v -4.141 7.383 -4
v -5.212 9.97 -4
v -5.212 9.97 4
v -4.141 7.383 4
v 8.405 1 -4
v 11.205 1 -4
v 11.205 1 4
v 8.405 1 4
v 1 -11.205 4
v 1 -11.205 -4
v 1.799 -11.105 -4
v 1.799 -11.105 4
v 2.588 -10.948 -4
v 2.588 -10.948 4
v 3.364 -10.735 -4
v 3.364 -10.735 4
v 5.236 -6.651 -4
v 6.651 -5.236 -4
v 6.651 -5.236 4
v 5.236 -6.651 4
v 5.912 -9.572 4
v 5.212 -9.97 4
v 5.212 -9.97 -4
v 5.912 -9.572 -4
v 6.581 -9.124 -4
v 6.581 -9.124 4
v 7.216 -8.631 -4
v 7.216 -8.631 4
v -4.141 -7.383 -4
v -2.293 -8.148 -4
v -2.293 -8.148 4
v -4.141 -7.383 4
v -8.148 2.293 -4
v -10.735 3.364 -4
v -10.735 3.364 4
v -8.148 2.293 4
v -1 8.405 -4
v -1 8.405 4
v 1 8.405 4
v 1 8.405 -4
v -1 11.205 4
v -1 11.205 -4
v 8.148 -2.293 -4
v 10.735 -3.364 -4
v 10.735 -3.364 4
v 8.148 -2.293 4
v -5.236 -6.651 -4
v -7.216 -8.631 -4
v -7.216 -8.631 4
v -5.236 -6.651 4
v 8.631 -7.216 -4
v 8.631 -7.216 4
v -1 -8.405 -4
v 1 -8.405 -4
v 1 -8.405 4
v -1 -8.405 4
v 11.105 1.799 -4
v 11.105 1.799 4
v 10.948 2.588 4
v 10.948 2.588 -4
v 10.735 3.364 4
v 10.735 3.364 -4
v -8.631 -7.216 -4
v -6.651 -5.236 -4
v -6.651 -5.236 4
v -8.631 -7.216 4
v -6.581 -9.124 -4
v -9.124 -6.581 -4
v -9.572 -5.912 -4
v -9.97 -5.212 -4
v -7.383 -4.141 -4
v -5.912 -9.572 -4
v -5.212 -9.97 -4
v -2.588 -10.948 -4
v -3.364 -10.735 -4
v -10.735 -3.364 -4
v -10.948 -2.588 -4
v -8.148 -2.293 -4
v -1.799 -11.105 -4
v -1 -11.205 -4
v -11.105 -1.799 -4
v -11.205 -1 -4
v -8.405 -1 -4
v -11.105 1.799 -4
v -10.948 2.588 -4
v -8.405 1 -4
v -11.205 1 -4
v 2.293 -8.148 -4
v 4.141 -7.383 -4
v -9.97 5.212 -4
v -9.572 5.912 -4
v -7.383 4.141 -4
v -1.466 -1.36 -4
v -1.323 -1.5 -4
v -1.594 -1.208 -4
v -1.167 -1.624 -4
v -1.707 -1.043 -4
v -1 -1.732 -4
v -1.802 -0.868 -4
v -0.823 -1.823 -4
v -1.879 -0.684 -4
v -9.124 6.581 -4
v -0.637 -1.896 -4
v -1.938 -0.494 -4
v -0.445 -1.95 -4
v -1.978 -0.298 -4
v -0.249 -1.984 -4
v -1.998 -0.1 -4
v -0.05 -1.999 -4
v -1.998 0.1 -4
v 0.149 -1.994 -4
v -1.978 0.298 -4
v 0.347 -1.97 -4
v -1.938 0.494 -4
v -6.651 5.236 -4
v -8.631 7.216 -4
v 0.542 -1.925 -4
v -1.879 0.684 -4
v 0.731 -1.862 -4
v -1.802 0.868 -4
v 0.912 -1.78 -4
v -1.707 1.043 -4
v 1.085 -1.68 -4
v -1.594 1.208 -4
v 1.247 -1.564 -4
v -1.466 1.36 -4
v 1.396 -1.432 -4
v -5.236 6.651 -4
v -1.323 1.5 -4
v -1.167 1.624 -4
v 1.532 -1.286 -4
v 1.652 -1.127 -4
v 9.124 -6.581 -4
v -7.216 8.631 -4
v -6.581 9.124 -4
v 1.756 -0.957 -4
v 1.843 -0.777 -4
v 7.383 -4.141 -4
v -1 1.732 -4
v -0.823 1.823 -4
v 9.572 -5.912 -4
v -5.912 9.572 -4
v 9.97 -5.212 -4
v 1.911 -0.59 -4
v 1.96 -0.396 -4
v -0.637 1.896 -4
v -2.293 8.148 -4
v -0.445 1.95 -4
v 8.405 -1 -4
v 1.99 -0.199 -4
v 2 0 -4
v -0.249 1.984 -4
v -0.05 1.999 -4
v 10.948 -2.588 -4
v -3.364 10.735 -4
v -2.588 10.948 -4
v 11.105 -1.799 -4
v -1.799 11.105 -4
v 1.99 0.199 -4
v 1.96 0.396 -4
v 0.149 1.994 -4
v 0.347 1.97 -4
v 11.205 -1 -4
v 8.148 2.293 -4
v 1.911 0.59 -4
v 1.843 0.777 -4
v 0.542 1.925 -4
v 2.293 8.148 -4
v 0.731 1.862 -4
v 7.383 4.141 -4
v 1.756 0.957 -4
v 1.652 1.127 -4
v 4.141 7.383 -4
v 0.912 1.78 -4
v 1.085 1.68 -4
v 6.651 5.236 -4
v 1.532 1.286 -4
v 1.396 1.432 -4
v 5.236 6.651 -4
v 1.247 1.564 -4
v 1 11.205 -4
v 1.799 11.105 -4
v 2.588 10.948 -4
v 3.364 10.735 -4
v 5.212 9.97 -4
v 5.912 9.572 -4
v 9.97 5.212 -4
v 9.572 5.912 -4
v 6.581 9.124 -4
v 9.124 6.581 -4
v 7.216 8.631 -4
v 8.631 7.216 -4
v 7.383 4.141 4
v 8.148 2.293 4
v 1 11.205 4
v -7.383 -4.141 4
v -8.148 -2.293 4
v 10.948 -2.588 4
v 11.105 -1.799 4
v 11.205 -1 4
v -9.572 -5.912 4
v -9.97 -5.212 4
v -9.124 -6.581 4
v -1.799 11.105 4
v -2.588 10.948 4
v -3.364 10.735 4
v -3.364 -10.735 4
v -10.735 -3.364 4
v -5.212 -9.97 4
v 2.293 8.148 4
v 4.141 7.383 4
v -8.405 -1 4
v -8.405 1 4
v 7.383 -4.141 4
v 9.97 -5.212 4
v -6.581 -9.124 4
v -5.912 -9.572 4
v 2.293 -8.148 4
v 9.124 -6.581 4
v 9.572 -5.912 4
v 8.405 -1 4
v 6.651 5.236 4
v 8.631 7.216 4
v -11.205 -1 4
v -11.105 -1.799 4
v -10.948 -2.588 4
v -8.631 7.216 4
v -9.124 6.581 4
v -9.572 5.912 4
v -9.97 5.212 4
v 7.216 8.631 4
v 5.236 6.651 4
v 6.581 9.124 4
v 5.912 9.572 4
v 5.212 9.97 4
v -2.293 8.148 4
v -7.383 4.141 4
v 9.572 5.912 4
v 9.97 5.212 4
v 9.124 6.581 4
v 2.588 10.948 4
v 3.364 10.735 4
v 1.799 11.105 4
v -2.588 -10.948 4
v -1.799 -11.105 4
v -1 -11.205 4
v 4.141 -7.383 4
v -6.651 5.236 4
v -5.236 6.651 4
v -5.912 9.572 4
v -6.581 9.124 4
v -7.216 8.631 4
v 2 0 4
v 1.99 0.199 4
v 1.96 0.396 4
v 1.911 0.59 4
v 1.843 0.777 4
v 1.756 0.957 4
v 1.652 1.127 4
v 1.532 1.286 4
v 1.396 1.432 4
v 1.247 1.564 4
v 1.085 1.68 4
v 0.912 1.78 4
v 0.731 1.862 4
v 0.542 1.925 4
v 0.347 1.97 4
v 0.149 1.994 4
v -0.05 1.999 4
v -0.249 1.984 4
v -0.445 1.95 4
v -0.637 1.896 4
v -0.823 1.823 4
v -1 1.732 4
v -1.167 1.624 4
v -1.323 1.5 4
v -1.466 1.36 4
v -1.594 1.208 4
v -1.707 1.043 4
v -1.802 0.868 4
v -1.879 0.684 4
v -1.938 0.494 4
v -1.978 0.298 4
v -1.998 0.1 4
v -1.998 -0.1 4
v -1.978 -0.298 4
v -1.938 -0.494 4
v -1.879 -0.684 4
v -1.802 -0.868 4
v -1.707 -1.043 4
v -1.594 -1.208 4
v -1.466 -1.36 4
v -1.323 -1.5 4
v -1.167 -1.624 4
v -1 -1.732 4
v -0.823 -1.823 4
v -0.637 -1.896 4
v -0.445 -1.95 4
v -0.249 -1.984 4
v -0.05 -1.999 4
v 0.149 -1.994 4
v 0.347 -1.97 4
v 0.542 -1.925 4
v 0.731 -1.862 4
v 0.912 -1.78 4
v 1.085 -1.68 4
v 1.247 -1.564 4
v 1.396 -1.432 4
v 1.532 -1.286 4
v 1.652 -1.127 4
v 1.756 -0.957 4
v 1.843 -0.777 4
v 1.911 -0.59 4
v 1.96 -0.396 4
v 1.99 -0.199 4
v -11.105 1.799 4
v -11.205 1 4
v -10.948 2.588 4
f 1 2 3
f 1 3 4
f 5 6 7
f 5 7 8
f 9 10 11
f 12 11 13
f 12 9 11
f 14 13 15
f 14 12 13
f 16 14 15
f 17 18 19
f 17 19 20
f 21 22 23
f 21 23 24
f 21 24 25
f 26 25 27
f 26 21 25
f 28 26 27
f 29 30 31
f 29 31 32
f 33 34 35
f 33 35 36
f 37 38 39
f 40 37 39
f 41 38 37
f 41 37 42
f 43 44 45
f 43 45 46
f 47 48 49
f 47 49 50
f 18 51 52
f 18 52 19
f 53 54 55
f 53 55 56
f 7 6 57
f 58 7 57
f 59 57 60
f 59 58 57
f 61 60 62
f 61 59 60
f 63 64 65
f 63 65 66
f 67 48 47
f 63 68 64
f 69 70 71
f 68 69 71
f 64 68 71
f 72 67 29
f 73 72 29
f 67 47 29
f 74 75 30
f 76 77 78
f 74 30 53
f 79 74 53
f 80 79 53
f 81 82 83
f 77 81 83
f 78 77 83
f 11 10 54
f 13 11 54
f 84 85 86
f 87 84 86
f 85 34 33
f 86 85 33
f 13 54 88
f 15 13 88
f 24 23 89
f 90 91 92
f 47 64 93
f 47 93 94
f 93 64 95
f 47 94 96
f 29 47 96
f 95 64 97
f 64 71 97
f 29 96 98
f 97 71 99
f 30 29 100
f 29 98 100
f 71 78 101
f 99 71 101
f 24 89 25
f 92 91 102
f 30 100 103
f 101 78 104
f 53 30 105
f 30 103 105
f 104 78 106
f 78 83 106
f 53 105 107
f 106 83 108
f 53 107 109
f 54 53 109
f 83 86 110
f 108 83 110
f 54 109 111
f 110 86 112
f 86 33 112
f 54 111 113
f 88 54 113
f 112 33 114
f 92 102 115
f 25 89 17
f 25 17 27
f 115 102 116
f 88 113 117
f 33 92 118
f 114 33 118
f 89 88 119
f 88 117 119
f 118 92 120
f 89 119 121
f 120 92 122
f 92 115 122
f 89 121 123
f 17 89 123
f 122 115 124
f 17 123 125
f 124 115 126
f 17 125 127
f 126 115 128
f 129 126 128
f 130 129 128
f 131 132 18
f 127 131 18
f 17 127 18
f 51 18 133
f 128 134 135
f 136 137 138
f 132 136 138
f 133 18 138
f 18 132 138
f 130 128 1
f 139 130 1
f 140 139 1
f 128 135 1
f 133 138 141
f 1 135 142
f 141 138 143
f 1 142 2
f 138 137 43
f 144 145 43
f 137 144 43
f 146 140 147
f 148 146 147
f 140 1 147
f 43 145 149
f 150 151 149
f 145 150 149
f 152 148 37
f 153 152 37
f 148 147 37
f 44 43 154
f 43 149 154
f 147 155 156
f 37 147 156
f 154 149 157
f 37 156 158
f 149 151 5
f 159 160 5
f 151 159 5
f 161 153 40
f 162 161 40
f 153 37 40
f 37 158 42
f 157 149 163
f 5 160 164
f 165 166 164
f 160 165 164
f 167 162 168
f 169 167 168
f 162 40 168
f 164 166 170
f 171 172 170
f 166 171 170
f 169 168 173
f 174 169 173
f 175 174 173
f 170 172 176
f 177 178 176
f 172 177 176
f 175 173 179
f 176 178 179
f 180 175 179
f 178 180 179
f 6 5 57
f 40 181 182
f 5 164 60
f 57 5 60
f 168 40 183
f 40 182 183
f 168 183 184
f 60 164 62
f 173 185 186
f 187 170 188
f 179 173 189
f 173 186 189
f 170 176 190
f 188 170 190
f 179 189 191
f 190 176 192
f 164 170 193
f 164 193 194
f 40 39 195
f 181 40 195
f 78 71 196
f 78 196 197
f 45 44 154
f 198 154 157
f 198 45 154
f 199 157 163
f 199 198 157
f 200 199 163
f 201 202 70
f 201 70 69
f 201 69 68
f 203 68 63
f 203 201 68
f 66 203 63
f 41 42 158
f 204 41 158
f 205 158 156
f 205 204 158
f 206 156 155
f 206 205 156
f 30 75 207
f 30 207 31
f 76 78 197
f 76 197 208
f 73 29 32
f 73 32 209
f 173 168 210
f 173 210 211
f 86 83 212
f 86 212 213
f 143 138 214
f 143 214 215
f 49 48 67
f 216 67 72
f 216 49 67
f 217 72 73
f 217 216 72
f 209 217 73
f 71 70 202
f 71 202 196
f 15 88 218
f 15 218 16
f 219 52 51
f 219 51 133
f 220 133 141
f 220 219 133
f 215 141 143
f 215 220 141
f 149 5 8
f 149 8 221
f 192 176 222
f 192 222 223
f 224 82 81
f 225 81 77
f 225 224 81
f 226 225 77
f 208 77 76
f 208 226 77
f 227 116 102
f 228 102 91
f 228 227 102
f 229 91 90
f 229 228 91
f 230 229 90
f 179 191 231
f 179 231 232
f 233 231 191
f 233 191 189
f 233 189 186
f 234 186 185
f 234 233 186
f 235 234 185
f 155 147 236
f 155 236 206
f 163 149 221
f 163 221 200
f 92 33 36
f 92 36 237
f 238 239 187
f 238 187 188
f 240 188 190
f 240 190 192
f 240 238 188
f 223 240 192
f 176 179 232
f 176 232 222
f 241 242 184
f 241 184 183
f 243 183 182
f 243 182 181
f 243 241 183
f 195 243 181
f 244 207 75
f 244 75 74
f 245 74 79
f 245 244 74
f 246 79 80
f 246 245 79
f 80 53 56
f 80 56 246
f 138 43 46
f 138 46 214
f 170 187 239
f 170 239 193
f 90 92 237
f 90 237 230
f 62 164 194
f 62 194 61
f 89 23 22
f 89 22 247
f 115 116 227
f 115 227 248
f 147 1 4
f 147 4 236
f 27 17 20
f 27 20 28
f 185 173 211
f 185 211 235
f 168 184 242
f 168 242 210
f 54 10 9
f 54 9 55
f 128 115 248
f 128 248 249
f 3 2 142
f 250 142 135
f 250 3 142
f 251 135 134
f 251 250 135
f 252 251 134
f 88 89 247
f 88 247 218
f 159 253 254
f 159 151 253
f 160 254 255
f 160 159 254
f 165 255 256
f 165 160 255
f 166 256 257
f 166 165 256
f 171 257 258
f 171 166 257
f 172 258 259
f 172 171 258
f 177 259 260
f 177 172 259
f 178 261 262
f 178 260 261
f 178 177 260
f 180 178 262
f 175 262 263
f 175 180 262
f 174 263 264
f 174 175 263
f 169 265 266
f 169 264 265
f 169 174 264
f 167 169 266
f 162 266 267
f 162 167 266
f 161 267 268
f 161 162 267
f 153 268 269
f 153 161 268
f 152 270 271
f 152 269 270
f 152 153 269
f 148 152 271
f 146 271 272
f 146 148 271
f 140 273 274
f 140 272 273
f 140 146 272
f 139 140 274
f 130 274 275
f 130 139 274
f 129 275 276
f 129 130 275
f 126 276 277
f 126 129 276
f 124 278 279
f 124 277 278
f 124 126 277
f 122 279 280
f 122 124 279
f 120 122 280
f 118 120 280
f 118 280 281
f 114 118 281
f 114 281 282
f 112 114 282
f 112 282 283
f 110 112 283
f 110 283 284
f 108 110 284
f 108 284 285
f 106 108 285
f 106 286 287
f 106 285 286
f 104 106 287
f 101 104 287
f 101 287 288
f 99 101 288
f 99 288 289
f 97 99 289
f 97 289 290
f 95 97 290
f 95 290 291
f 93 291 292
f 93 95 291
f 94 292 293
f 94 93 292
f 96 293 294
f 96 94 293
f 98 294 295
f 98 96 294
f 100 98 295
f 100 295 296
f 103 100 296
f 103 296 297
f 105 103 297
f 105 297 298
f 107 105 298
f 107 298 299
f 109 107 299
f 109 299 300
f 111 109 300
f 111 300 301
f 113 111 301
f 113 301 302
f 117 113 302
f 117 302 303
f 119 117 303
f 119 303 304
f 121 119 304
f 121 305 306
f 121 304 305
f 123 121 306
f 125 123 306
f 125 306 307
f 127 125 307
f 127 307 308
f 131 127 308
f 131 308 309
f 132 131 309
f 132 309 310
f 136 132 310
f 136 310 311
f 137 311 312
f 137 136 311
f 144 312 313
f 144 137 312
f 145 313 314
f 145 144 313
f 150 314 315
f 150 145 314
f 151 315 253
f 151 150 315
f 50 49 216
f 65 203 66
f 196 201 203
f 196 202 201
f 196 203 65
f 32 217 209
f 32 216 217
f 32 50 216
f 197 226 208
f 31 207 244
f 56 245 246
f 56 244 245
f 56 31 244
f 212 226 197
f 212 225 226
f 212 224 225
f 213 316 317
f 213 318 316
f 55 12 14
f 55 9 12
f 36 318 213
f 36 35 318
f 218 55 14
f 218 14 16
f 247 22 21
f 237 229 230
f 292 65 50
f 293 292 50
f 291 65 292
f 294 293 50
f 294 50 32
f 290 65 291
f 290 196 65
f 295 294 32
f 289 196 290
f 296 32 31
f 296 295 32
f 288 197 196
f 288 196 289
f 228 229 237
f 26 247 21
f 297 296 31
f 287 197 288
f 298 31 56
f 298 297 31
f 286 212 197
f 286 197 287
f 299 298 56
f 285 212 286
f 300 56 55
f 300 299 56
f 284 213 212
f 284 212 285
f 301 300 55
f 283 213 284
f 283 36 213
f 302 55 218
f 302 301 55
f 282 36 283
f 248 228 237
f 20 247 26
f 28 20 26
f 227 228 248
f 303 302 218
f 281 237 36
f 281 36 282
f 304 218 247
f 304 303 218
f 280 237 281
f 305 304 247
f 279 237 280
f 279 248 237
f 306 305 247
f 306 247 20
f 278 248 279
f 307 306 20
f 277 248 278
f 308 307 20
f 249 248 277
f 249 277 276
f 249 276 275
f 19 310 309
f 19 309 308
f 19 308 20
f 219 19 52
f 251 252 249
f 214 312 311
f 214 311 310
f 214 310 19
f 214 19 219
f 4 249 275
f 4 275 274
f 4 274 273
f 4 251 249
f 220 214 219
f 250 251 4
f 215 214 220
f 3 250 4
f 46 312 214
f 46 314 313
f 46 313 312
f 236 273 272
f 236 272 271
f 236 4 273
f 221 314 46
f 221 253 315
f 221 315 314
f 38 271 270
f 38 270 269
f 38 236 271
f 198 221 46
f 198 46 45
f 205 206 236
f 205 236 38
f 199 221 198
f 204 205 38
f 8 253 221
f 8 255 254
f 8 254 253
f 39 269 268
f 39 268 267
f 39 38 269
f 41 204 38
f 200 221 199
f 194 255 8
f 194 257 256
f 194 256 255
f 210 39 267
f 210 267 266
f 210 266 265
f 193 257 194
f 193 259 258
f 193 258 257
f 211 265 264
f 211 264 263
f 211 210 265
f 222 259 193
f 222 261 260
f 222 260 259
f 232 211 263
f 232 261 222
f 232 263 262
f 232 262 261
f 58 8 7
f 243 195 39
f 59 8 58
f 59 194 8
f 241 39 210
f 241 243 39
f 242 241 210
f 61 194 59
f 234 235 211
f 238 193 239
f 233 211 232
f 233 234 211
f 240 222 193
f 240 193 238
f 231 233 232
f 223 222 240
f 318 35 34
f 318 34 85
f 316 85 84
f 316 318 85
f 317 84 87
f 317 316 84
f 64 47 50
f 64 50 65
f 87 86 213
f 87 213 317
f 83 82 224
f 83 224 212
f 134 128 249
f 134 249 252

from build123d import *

# Parameters (mm, degrees)
SKETCH1_R               = 11.25
BOSS_EXTRUDE1_DEPTH     = 4
SKETCH2_W               = 2
SKETCH2_H               = 2.8
CUT_EXTRUDE2_DEPTH      = 18.808003819
CIRPATTERN1_START       = -4
CIRPATTERN1_DEPTH       = 8
CUT_EXTRUDE3_DEPTH      = 18.751760477
CUT_EXTRUDE3_DEPTH_BACK = 18.751760477
SKETCH4_R               = 2


# Read off the part's stored shape, not the designer's step: CirPattern1
with BuildPart() as part:
    # Sketch1 → Boss-Extrude1 (new, symmetric)
    with BuildSketch(Plane.XY):
        Circle(SKETCH1_R)
    extrude(amount=BOSS_EXTRUDE1_DEPTH, both=True)

    # Sketch2 → Cut-Extrude2 (cut, symmetric)
    with BuildSketch(Plane.XY.offset(4)):
        with Locations((0, 9.805467416)):
            Rectangle(SKETCH2_W, SKETCH2_H)
    extrude(amount=CUT_EXTRUDE2_DEPTH, both=True, mode=Mode.SUBTRACT)


with BuildPart() as cut_extrude2_kept_piece:
    # of the separate pieces the step leaves, the one the design keeps (cut_extrude2_pieces_kept)
    add(part.part.solids().sort_by_distance((1, 8.405467416, 4))[0])

    # CirPattern1 outline → CirPattern1 (cut)
    with BuildSketch(Plane.XY.offset(CIRPATTERN1_START)):
        with BuildLine():
            Line((1, -8.405467416), (-1, -8.405467416))
            Line((-1, -8.405467416), (-1, -11.205467416))
            ThreePointArc((-1, -11.205467416), (0, -11.25), (1, -11.205467416))
            Line((1, -11.205467416), (1, -8.405467416))
        make_face()
        with BuildLine():
            Line((4.140512654, 7.382955874), (5.212026264, 9.969818566))
            ThreePointArc((5.212026264, 9.969818566), (4.305188614, 10.393644741), (3.364267199, 10.73518543))
            Line((3.364267199, 10.73518543), (2.292753589, 8.148322739))
            Line((2.292753589, 8.148322739), (4.140512654, 7.382955874))
        make_face()
        with BuildLine():
            Line((6.65066979, 5.236456227), (8.630568777, 7.216355215))
            ThreePointArc((8.630568777, 7.216355215), (7.954951289, 7.954951289), (7.216355215, 8.630568777))
            Line((7.216355215, 8.630568777), (5.236456227, 6.65066979))
            Line((5.236456227, 6.65066979), (6.65066979, 5.236456227))
        make_face()
        with BuildLine():
            Line((8.148322739, 2.292753589), (10.73518543, 3.364267199))
            ThreePointArc((10.73518543, 3.364267199), (10.393644741, 4.305188614), (9.969818565, 5.212026264))
            Line((9.969818565, 5.212026264), (7.382955874, 4.140512654))
            Line((7.382955874, 4.140512654), (8.148322739, 2.292753589))
        make_face()
        with BuildLine():
            Line((8.405467416, -1), (11.205467416, -1))
            ThreePointArc((11.205467416, -1), (11.25, 0), (11.205467416, 1))
            Line((11.205467416, 1), (8.405467416, 1))
            Line((8.405467416, 1), (8.405467416, -1))
        make_face()
        with BuildLine():
            Line((7.382955874, -4.140512654), (9.969818565, -5.212026264))
            ThreePointArc((9.969818565, -5.212026264), (10.393644741, -4.305188614), (10.73518543, -3.364267199))
            Line((10.73518543, -3.364267199), (8.148322739, -2.292753589))
            Line((8.148322739, -2.292753589), (7.382955874, -4.140512654))
        make_face()
        with BuildLine():
            Line((5.236456227, -6.65066979), (7.216355215, -8.630568777))
            ThreePointArc((7.216355215, -8.630568777), (7.954951288, -7.954951288), (8.630568777, -7.216355215))
            Line((8.630568777, -7.216355215), (6.65066979, -5.236456227))
            Line((6.65066979, -5.236456227), (5.236456227, -6.65066979))
        make_face()
        with BuildLine():
            Line((2.292753589, -8.148322739), (3.364267199, -10.73518543))
            ThreePointArc((3.364267199, -10.73518543), (4.305188614, -10.393644741), (5.212026264, -9.969818565))
            Line((5.212026264, -9.969818565), (4.140512654, -7.382955874))
            Line((4.140512654, -7.382955874), (2.292753589, -8.148322739))
        make_face()
        with BuildLine():
            ThreePointArc((-3.364267199, 10.73518543), (-4.305188614, 10.393644741), (-5.212026264, 9.969818566))
            Line((-5.212026264, 9.969818566), (-4.140512654, 7.382955874))
            Line((-4.140512654, 7.382955874), (-2.292753589, 8.148322739))
            Line((-2.292753589, 8.148322739), (-3.364267199, 10.73518543))
        make_face()
        with BuildLine():
            ThreePointArc((-7.216355215, 8.630568777), (-7.954951289, 7.954951289), (-8.630568777, 7.216355215))
            Line((-8.630568777, 7.216355215), (-6.65066979, 5.236456227))
            Line((-6.65066979, 5.236456227), (-5.236456227, 6.65066979))
            Line((-5.236456227, 6.65066979), (-7.216355215, 8.630568777))
        make_face()
        with BuildLine():
            ThreePointArc((-9.969818565, 5.212026264), (-10.393644741, 4.305188614), (-10.73518543, 3.364267199))
            Line((-10.73518543, 3.364267199), (-8.148322739, 2.292753589))
            Line((-8.148322739, 2.292753589), (-7.382955874, 4.140512654))
            Line((-7.382955874, 4.140512654), (-9.969818565, 5.212026264))
        make_face()
        with BuildLine():
            ThreePointArc((-11.205467416, 1), (-11.25, 0), (-11.205467416, -1))
            Line((-11.205467416, -1), (-8.405467416, -1))
            Line((-8.405467416, -1), (-8.405467416, 1))
            Line((-8.405467416, 1), (-11.205467416, 1))
        make_face()
        with BuildLine():
            ThreePointArc((-10.73518543, -3.364267199), (-10.393644741, -4.305188614), (-9.969818565, -5.212026264))
            Line((-9.969818565, -5.212026264), (-7.382955874, -4.140512654))
            Line((-7.382955874, -4.140512654), (-8.148322739, -2.292753589))
            Line((-8.148322739, -2.292753589), (-10.73518543, -3.364267199))
        make_face()
        with BuildLine():
            ThreePointArc((-8.630568777, -7.216355215), (-7.954951288, -7.954951288), (-7.216355215, -8.630568777))
            Line((-7.216355215, -8.630568777), (-5.236456227, -6.65066979))
            Line((-5.236456227, -6.65066979), (-6.65066979, -5.236456227))
            Line((-6.65066979, -5.236456227), (-8.630568777, -7.216355215))
        make_face()
        with BuildLine():
            ThreePointArc((-5.212026264, -9.969818565), (-4.305188614, -10.393644741), (-3.364267199, -10.73518543))
            Line((-3.364267199, -10.73518543), (-2.292753589, -8.148322739))
            Line((-2.292753589, -8.148322739), (-4.140512654, -7.382955874))
            Line((-4.140512654, -7.382955874), (-5.212026264, -9.969818565))
        make_face()
    extrude(amount=CIRPATTERN1_DEPTH, mode=Mode.SUBTRACT)

    # Sketch4 → Cut-Extrude3 (cut, two sides: drawn at the far end of the back side and taken through both)
    with BuildSketch(Plane.XY.offset(4).offset(-CUT_EXTRUDE3_DEPTH_BACK)):
        Circle(SKETCH4_R)
    extrude(amount=CUT_EXTRUDE3_DEPTH + CUT_EXTRUDE3_DEPTH_BACK, mode=Mode.SUBTRACT)


solid = cut_extrude2_kept_piece.part
